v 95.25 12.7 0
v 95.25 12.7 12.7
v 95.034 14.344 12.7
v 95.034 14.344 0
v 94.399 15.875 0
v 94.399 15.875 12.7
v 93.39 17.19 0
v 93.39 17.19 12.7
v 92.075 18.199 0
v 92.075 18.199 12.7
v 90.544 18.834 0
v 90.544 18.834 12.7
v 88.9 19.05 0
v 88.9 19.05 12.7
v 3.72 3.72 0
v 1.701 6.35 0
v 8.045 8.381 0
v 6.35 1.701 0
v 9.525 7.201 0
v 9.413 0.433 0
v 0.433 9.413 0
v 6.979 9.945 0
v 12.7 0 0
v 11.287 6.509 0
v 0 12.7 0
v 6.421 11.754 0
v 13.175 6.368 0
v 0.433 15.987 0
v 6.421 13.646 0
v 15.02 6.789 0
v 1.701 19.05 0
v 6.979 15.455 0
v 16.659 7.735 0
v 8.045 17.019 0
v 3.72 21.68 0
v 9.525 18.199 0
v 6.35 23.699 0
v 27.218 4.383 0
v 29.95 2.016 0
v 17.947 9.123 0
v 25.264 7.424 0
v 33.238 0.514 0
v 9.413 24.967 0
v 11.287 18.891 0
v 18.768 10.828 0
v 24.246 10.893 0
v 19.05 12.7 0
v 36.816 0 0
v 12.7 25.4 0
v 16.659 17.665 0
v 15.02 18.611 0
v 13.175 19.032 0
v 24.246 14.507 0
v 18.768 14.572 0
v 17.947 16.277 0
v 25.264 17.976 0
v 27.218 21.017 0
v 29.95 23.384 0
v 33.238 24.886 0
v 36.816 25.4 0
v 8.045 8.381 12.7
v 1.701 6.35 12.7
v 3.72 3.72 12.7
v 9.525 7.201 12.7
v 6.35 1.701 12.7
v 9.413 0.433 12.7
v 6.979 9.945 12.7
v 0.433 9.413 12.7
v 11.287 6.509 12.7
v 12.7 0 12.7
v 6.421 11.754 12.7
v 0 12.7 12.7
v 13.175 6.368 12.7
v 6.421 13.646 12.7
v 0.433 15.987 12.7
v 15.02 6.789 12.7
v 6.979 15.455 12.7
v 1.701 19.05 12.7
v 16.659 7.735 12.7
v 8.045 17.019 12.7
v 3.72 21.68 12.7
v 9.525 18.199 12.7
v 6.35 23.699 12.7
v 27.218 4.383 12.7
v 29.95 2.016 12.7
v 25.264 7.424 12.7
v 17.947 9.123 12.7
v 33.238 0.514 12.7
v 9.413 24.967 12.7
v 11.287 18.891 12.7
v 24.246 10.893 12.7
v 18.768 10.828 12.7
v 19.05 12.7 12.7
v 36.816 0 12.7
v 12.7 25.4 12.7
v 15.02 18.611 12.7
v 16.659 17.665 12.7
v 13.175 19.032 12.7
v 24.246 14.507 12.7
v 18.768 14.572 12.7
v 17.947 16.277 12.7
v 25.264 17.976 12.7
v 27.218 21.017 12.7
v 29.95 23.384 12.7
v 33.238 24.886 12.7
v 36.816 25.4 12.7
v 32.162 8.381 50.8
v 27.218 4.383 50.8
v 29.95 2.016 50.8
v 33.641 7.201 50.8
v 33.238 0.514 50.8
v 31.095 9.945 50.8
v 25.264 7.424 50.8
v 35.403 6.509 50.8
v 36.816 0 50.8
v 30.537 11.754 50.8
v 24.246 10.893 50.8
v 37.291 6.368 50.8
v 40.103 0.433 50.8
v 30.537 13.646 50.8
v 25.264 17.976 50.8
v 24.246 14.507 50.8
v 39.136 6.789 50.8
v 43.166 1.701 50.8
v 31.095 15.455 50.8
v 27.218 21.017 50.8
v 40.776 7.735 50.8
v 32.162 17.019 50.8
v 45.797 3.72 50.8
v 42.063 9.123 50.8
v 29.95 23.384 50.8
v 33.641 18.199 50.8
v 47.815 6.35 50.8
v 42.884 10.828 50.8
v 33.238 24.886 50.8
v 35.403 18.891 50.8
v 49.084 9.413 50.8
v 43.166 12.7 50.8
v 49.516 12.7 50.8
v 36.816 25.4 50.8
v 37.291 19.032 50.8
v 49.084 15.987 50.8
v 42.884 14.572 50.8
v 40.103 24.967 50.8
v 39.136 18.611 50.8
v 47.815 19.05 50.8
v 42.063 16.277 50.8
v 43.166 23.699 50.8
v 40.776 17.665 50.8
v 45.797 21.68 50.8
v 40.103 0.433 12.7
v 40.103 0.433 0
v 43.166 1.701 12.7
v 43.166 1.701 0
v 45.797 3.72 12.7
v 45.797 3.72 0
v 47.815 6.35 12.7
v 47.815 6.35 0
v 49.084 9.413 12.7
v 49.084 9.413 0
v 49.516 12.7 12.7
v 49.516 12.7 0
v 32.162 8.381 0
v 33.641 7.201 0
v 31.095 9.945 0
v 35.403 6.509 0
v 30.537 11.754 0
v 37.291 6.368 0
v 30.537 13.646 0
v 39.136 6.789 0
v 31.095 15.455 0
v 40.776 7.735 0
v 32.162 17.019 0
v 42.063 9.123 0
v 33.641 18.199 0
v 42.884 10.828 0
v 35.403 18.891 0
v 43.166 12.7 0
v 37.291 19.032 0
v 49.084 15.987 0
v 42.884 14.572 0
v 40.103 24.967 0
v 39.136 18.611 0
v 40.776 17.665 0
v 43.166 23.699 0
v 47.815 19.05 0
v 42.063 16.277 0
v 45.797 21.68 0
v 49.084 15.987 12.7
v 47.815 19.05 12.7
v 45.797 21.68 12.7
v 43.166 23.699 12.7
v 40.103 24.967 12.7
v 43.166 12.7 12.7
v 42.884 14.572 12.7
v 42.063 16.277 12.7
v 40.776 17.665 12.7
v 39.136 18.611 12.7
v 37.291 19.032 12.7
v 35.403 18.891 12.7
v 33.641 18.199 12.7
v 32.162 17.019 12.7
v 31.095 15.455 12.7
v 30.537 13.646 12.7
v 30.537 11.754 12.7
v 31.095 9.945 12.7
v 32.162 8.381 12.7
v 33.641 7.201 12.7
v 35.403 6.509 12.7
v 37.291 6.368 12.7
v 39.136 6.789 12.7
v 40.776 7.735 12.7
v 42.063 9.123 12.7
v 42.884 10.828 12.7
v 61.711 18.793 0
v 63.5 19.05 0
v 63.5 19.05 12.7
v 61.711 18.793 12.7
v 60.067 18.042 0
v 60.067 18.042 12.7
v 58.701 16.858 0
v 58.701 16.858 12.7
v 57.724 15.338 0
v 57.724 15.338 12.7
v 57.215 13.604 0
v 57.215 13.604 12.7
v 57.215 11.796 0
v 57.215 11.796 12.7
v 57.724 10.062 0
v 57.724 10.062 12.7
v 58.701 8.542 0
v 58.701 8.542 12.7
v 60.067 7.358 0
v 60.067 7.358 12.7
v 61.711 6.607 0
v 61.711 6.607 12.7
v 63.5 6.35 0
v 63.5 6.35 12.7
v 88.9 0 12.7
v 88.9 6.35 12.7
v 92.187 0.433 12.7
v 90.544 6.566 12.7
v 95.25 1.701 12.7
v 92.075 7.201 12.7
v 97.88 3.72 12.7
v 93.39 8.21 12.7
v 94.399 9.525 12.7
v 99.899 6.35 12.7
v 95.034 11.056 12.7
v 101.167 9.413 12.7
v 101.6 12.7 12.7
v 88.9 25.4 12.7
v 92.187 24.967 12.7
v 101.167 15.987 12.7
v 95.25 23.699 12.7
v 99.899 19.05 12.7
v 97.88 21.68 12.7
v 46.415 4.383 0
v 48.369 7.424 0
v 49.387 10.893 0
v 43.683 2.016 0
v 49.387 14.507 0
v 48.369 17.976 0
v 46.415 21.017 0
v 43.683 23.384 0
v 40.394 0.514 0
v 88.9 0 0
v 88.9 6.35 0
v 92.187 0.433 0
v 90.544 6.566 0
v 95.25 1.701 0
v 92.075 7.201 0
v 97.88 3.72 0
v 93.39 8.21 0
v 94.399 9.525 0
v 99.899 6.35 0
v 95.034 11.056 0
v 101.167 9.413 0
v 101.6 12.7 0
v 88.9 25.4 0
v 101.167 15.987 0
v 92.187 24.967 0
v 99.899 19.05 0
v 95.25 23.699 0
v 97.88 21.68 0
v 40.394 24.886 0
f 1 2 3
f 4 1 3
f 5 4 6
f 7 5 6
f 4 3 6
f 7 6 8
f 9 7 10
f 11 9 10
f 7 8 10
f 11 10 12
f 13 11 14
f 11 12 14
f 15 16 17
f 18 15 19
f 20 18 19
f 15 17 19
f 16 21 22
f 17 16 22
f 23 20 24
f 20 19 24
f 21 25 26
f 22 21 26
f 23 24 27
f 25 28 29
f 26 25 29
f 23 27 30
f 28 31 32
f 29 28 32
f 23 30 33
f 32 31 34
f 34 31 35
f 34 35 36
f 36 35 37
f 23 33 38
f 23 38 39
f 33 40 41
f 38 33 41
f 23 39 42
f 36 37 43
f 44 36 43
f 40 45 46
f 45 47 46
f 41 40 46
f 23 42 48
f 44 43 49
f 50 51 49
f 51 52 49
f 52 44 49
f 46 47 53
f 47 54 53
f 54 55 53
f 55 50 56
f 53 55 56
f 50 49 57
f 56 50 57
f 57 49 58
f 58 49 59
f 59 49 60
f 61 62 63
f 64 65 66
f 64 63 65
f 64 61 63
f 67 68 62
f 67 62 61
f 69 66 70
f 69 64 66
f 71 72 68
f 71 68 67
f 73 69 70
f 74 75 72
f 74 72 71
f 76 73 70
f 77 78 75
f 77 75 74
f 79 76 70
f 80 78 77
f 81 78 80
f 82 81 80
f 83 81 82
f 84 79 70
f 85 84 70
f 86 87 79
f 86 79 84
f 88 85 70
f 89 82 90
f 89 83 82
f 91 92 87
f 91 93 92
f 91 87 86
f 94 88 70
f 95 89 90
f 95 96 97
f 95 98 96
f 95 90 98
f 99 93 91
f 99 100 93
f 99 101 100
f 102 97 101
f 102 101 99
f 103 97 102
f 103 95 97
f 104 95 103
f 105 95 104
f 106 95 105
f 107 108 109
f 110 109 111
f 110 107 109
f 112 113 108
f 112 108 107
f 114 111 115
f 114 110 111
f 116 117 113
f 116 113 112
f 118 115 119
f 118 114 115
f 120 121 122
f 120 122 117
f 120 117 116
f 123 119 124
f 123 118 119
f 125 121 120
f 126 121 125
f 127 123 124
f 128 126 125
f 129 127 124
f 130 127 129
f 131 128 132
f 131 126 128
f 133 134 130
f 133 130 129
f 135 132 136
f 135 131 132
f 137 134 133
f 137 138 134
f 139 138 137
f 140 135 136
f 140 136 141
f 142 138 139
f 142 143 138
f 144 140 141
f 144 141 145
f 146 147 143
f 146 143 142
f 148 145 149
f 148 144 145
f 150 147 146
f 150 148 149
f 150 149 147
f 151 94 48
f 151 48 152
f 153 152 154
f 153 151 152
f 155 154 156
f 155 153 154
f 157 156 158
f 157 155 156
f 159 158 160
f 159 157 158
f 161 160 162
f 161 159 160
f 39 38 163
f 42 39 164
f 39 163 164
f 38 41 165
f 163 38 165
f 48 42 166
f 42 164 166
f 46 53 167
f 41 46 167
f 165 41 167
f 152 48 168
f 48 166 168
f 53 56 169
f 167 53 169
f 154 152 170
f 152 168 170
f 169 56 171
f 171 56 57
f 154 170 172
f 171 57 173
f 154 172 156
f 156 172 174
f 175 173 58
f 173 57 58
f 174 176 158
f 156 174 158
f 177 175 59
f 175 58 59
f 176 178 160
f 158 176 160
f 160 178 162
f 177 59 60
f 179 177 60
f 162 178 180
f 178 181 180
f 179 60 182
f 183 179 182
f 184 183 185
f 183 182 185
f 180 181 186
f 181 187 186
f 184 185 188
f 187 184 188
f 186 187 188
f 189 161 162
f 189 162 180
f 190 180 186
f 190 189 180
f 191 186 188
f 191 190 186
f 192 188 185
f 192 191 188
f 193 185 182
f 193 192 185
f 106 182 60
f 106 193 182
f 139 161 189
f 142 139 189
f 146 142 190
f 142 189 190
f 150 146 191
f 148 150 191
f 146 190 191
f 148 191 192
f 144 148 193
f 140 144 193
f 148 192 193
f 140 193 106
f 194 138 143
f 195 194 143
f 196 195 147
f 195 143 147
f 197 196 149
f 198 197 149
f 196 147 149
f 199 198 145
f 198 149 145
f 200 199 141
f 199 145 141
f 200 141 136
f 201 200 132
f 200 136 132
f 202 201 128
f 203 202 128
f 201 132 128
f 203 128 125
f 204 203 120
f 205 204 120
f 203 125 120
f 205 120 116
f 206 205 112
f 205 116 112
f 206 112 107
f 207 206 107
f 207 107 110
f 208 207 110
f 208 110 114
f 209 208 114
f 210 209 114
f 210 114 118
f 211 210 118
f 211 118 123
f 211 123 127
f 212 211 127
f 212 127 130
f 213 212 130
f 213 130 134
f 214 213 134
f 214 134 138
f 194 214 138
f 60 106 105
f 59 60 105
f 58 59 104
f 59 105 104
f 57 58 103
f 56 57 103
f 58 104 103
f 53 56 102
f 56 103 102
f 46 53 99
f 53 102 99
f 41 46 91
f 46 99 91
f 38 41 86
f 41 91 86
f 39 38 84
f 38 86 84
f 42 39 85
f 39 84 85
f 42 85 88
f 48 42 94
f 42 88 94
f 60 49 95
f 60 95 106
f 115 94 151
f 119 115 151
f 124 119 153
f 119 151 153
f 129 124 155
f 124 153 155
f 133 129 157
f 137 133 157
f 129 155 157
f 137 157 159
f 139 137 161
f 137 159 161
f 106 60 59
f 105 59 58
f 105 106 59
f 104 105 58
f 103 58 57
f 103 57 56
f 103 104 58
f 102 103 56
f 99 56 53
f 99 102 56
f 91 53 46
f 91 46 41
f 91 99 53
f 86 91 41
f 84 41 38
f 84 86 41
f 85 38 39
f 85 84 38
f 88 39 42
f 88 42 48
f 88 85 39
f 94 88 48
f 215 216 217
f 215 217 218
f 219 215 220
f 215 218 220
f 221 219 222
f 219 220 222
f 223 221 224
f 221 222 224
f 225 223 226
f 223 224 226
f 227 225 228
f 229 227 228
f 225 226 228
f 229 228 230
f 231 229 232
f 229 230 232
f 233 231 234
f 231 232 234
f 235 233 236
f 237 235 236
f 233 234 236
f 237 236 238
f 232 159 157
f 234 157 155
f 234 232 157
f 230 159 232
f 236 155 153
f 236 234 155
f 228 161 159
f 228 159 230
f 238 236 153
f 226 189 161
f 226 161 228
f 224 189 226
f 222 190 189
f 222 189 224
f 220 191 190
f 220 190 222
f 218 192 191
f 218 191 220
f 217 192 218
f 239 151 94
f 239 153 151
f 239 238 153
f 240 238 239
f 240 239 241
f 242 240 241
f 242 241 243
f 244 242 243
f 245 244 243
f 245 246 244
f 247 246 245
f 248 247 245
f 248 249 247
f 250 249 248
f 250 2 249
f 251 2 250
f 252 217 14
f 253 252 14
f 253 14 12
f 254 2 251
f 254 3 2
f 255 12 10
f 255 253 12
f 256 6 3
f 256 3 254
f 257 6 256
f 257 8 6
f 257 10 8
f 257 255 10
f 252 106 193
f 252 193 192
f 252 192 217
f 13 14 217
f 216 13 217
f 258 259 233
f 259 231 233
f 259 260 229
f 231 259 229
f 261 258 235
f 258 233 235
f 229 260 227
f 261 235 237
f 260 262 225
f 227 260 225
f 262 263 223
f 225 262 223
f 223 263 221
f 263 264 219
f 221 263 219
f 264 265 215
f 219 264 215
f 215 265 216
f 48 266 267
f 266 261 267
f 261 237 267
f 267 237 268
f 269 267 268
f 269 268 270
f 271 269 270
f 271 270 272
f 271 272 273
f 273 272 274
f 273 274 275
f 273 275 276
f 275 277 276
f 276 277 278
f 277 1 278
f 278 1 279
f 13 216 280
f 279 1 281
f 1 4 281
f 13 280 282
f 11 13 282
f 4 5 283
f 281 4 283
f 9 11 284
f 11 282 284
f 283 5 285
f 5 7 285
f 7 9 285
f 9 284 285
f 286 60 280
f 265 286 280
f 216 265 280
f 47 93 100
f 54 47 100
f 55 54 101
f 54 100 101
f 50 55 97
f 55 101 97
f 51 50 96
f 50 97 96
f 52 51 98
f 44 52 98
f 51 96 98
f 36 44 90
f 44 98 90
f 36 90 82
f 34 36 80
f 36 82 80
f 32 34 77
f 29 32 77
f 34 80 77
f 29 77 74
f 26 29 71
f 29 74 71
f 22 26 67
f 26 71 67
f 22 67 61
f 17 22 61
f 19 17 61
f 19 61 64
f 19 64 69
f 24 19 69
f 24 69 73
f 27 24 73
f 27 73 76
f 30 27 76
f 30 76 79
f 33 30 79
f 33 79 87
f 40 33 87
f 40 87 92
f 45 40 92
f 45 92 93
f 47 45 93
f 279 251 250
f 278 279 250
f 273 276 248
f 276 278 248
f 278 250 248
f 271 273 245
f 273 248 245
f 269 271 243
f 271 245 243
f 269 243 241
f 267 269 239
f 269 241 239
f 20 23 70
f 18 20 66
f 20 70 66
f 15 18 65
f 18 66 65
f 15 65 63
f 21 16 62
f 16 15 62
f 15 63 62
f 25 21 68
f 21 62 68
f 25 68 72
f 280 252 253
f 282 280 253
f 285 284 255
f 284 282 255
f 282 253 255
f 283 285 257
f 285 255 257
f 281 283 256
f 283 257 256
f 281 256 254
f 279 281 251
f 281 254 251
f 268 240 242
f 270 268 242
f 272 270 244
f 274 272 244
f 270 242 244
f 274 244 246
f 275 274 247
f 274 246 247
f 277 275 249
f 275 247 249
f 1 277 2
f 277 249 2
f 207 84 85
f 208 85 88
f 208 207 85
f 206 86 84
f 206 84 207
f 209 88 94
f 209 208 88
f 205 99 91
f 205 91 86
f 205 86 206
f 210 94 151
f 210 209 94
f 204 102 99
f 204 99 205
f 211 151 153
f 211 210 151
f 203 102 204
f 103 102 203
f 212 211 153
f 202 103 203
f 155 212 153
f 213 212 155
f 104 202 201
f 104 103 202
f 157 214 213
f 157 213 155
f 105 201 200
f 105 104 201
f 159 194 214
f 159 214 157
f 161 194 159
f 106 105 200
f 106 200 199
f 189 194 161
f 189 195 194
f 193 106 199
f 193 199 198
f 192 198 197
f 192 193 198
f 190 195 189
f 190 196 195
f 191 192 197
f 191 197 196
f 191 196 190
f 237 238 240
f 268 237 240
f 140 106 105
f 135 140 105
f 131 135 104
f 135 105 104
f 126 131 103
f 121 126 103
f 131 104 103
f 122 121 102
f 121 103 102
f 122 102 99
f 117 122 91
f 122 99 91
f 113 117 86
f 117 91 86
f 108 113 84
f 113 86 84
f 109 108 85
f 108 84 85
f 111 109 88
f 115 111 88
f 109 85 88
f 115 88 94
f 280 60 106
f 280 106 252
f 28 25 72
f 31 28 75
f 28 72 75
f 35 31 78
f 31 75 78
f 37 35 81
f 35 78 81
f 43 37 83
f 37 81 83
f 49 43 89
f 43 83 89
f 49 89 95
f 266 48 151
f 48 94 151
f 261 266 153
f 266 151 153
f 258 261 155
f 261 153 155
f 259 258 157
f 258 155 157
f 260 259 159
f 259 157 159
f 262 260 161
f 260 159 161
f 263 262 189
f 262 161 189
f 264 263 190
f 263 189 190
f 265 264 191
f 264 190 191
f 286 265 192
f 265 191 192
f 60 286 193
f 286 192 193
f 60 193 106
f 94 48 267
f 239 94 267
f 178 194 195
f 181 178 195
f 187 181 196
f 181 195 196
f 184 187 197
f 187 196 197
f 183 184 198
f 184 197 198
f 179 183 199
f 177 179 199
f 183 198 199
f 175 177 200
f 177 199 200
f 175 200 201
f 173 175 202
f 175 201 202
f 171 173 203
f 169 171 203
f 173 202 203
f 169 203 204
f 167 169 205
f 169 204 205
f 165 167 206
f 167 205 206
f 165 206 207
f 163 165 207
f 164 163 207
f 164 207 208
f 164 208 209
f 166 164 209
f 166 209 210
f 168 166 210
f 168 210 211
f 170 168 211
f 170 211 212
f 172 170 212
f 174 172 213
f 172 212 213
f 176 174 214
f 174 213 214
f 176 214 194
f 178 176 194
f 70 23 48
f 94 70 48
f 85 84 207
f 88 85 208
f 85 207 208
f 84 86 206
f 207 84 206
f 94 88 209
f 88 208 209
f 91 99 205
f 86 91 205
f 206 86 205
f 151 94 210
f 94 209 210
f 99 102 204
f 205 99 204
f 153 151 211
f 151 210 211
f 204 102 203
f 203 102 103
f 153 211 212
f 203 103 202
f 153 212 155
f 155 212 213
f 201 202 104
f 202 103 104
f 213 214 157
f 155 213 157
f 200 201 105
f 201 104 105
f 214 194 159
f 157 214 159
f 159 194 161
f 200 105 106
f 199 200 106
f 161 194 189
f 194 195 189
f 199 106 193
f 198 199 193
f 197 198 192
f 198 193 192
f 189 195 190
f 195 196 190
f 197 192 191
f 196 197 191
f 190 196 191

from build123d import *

# Parameters (mm, degrees)
F0_W      = 101.6
F0_H      = 25.4
F1_DEPTH  = 12.7
F3_DEPTH  = 38.1
F2_R      = 6.35
F2_R_2    = 12.7
F4_DEPTH  = 25.4
F5_R      = 6.35
F6_DEPTH  = 50.8
F7_DEPTH  = 12.7
F9_DEPTH  = 12.7
F11_DEPTH = 25.4
F13_DEPTH = 25.4


with BuildPart() as f1:
    # F0 (on Top) → F1 (new body)
    with BuildSketch(Plane.XY):
        with Locations((50.8, 12.7)):
            Rectangle(F0_W, F0_H)
    extrude(amount=F1_DEPTH)

    # F2 (on face) → F3 (join)
    with BuildSketch(Plane.XY.offset(12.7)):
        with BuildLine():
            ThreePointArc((36.8164852262, 0), (45.7967413472, 3.7197438789), (49.5164852262, 12.7))
            ThreePointArc((49.5164852262, 12.7), (45.7967413472, 21.6802561211), (36.8164852262, 25.4))
            ThreePointArc((36.8164852262, 25.4), (24.1164852262, 12.7), (36.8164852262, 0))
        make_face()
    extrude(amount=F3_DEPTH)

    # F2 (on face) → F4 (cut)
    with BuildSketch(Plane.XY.offset(12.7)):
        with Locations((12.7, 12.7)):
            Circle(F2_R)
        with Locations((36.8164852262, 12.7)):
            Circle(F2_R_2)
    extrude(amount=-F4_DEPTH, mode=Mode.SUBTRACT)

    # F5 (on face) → F6 (cut)
    with BuildSketch(Plane.XY.offset(50.8)):
        with Locations((36.8164852262, 12.7)):
            Circle(F5_R)
    extrude(amount=-F6_DEPTH, mode=Mode.SUBTRACT)


with BuildPart() as f7:
    # F7 (new): a face of the model
    f7_faces = [f1.part.faces().sort_by_distance(p)[0] for p in [
        (45.5427413472, 21.4262561211, 12.7),
    ]]
    extrude(f7_faces, amount=F7_DEPTH)


with BuildPart() as f1_1:
    add(f1.part)

    # F8 (on face) → F9 (cut)
    with BuildSketch(Plane.XY.offset(12.7)):
        with BuildLine():
            ThreePointArc((63.5, 6.35), (67.9901280605, 8.2098719395), (69.85, 12.7))
            ThreePointArc((69.85, 12.7), (67.9901280605, 17.1901280605), (63.5, 19.05))
            ThreePointArc((63.5, 19.05), (57.15, 12.7), (63.5, 6.35))
        make_face()
        with BuildLine():
            ThreePointArc((63.5, 19.05), (67.9901280605, 17.1901280605), (69.85, 12.7))
            ThreePointArc((69.85, 12.7), (67.9901280605, 8.2098719395), (63.5, 6.35))
            Line((63.5, 6.35), (88.9, 6.35))
            ThreePointArc((88.9, 6.35), (82.55, 12.7), (88.9, 19.05))
            Line((88.9, 19.05), (63.5, 19.05))
        make_face()
        with BuildLine():
            ThreePointArc((95.25, 12.7), (93.3901280605, 17.1901280605), (88.9, 19.05))
            ThreePointArc((88.9, 19.05), (82.55, 12.7), (88.9, 6.35))
            ThreePointArc((88.9, 6.35), (93.3901280605, 8.2098719395), (95.25, 12.7))
        make_face()
    extrude(amount=-F9_DEPTH, mode=Mode.SUBTRACT)

    # F10 (on face) → F11 (cut)
    with BuildSketch(Plane.XY.offset(12.7)):
        with BuildLine():
            ThreePointArc((0, 12.7), (3.7197438789, 21.6802561211), (12.7, 25.4))
            Line((12.7, 25.4), (0, 25.4))
            Line((0, 25.4), (0, 12.7))
        make_face()
        with BuildLine():
            ThreePointArc((12.7000005348, 0), (3.719744068, 3.7197436899), (0, 12.7))
            Line((0, 12.7), (0, 0))
            Line((0, 0), (12.7000005348, 0))
        make_face()
    extrude(amount=-F11_DEPTH, mode=Mode.SUBTRACT)

    # F12 (on face) → F13 (cut)
    with BuildSketch(Plane.XY.offset(12.7)):
        with BuildLine():
            ThreePointArc((88.9, 25.4), (97.8802561211, 21.6802561211), (101.6, 12.7))
            Line((101.6, 12.7), (101.6, 25.4))
            Line((101.6, 25.4), (88.9, 25.4))
        make_face()
        with BuildLine():
            ThreePointArc((101.6, 12.7), (97.8802561211, 3.7197438789), (88.9, 0))
            Line((88.9, 0), (101.6, 0))
            Line((101.6, 0), (101.6, 12.7))
        make_face()
    extrude(amount=-F13_DEPTH, mode=Mode.SUBTRACT)


solid = Compound([f7.part, f1_1.part])
